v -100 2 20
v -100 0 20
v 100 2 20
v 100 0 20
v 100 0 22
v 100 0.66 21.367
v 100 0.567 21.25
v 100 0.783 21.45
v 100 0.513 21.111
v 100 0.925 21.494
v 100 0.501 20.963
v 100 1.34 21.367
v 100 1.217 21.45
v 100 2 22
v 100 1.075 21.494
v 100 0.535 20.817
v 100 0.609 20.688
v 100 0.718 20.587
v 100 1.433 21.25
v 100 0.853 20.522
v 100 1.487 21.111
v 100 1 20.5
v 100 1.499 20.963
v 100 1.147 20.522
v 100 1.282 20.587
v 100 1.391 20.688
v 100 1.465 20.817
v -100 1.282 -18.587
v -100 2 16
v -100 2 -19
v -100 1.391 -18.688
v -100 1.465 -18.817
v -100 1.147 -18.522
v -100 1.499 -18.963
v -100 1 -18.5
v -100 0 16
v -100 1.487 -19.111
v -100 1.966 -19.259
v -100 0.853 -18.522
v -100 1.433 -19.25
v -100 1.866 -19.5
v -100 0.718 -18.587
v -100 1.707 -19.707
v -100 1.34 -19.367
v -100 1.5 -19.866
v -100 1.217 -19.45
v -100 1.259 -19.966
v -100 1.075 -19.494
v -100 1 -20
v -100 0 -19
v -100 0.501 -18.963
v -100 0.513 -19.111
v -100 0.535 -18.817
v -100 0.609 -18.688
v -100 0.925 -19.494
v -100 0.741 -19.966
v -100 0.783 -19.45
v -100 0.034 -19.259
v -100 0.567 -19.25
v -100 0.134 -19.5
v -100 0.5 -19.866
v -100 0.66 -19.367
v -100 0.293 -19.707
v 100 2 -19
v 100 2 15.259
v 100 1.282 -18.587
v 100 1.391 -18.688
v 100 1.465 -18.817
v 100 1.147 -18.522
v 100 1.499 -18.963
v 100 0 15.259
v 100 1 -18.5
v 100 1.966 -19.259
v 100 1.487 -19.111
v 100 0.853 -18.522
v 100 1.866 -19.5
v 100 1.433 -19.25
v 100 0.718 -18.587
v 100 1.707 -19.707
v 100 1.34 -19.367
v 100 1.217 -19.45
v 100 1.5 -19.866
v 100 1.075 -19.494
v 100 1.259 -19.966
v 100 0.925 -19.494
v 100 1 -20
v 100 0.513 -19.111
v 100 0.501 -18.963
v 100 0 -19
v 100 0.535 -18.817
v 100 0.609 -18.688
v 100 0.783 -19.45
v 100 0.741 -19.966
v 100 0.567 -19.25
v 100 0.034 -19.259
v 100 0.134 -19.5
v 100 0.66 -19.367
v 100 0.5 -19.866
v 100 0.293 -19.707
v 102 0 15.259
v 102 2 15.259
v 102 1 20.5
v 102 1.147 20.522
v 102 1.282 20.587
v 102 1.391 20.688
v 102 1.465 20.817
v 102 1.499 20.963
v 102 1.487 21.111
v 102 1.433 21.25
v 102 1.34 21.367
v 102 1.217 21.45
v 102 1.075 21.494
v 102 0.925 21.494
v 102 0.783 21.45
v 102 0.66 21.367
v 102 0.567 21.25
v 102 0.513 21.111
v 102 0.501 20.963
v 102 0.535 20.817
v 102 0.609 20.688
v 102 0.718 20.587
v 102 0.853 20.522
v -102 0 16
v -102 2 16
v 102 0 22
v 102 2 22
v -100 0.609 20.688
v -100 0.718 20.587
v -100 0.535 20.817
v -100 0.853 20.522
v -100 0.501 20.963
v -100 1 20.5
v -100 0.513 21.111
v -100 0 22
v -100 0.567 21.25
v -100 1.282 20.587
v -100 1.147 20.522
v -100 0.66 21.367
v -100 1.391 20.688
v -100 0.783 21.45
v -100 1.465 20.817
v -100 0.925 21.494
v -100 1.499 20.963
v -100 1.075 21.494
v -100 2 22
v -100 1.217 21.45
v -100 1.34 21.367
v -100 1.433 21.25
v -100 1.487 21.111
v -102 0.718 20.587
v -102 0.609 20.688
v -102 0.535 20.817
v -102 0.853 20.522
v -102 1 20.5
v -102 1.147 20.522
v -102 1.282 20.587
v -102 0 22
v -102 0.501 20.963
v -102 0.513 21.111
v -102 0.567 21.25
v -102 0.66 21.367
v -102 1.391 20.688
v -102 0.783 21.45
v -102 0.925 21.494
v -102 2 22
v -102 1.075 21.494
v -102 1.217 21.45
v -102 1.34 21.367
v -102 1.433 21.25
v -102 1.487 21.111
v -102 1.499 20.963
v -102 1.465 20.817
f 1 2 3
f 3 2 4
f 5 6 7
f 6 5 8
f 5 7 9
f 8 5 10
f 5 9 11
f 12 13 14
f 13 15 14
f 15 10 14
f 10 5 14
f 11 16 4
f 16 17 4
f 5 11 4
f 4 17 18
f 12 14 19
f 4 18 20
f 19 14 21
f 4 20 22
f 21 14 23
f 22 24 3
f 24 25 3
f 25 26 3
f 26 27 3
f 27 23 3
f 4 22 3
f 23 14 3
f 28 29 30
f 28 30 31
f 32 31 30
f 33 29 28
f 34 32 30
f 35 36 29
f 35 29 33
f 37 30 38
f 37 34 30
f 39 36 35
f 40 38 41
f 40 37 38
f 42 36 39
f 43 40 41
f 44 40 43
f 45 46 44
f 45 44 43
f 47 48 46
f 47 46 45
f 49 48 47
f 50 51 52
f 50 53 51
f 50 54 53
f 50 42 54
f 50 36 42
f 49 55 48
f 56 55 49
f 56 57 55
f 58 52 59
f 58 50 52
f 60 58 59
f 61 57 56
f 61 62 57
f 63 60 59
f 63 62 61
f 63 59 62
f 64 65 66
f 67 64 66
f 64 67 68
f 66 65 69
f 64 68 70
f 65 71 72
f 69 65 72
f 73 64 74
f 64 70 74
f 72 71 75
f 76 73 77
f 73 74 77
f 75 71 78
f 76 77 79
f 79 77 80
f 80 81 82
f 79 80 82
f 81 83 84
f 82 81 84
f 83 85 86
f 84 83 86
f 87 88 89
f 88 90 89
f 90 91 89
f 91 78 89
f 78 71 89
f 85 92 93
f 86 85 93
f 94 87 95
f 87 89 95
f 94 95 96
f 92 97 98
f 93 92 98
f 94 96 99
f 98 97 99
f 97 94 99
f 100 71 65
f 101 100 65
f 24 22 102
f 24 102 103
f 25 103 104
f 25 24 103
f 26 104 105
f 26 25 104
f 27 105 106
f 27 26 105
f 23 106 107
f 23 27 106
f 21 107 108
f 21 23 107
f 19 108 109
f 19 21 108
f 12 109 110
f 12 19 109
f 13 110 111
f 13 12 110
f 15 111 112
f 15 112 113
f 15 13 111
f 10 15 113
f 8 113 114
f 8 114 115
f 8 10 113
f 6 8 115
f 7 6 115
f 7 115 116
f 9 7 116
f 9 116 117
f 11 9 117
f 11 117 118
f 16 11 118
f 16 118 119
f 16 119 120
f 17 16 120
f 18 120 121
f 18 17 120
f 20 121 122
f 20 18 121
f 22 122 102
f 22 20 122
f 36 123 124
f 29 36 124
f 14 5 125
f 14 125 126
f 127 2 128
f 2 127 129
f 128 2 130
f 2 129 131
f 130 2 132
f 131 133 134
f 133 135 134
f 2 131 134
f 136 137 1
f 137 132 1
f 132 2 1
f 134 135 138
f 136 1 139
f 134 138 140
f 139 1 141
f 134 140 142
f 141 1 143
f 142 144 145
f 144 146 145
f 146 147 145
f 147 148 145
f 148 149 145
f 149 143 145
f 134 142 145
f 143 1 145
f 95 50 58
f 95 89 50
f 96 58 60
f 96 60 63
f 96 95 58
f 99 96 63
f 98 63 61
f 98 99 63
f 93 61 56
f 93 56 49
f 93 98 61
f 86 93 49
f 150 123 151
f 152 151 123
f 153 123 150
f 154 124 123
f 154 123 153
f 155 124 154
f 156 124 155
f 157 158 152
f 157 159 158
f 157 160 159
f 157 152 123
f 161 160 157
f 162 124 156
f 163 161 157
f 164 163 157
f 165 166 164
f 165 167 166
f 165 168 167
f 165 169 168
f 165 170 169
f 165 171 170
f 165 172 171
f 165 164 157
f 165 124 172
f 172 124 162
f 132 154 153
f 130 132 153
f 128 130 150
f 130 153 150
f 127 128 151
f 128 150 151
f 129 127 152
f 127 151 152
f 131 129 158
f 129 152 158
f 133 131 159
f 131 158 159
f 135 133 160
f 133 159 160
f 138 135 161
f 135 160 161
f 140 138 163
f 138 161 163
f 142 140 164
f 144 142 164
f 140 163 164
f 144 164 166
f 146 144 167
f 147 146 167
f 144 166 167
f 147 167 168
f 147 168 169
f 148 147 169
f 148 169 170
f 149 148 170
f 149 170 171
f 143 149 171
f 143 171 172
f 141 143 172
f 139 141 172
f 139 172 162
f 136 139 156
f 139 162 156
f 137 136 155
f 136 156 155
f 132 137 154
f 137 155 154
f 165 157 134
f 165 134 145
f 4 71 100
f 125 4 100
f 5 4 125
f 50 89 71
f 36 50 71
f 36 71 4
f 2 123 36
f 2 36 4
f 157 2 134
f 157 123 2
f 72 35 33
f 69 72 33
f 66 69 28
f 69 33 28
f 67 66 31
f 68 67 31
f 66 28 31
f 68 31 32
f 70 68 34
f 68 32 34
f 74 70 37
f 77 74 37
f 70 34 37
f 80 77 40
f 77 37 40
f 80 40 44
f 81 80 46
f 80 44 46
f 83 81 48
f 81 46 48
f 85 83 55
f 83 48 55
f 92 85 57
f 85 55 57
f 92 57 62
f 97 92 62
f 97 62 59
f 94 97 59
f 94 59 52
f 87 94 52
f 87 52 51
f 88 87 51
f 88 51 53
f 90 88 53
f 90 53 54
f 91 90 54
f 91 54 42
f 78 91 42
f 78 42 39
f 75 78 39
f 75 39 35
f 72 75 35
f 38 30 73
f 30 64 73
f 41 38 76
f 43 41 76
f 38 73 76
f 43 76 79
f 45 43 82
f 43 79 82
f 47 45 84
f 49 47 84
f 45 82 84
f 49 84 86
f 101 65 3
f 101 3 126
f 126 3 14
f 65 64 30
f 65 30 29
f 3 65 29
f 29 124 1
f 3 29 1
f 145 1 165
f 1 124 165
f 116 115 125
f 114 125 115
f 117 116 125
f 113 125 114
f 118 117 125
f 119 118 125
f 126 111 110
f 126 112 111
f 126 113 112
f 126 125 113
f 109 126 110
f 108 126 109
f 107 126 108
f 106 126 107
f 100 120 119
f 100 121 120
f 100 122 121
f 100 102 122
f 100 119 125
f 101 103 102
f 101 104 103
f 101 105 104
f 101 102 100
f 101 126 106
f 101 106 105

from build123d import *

# Parameters (mm, degrees)
SKETCH1_W           = 200
SKETCH1_H           = 40
BOSS_EXTRUDE1_DEPTH = 2
SKETCH2_W           = 6.740804159
SKETCH2_H           = 2
SKETCH2_R           = 0.5
BOSS_EXTRUDE2_DEPTH = 2
BOSS_EXTRUDE3_START = 2
SKETCH3_W           = 6
SKETCH3_H           = 2
SKETCH3_R           = 0.5
BOSS_EXTRUDE3_DEPTH = 2
SKETCH4_R           = 0.5
CUT_EXTRUDE1_DEPTH  = 204.204330663
FILLET2_R           = 1


with BuildPart() as part:
    # Sketch1 → Boss-Extrude1 (new body)
    with BuildSketch(Plane(origin=(0, 0, 0), x_dir=(1, 0, 0), z_dir=(0, 1, 0))):
        Rectangle(SKETCH1_W, SKETCH1_H)
    extrude(amount=BOSS_EXTRUDE1_DEPTH)

    # Sketch2 → Boss-Extrude2 (add)
    with BuildSketch(Plane(origin=(100, 0, 0), x_dir=(0, 0, -1), z_dir=(1, 0, 0))):
        with Locations((-18.629597921, 1)):
            Rectangle(SKETCH2_W, SKETCH2_H)
        with Locations((-21, 1)):
            Circle(SKETCH2_R, mode=Mode.SUBTRACT)
    extrude(amount=BOSS_EXTRUDE2_DEPTH)

    # Sketch3 → Boss-Extrude3 (add)
    with BuildSketch(Plane.ZY.offset(100).offset(BOSS_EXTRUDE3_START)):
        with Locations((19, 1)):
            Rectangle(SKETCH3_W, SKETCH3_H)
        with Locations(Location((21, 1, 0), (0, 0, 180))):
            Circle(SKETCH3_R, mode=Mode.SUBTRACT)
    extrude(amount=-BOSS_EXTRUDE3_DEPTH)

    # Sketch4 → Cut-Extrude1 (cut, through all)
    with BuildSketch(Plane.ZY.offset(100)):
        with Locations((-19, 1)):
            Circle(SKETCH4_R)
    extrude(amount=-CUT_EXTRUDE1_DEPTH, mode=Mode.SUBTRACT)

    # Fillet2
    fillet2_edges = [part.edges().sort_by_distance(p)[0] for p in [
        (0, 0, -20),
        (0, 2, -20),
    ]]
    fillet(fillet2_edges, radius=FILLET2_R - 0.0001)  # a hair under: the kernel refuses the full size


solid = part.part
